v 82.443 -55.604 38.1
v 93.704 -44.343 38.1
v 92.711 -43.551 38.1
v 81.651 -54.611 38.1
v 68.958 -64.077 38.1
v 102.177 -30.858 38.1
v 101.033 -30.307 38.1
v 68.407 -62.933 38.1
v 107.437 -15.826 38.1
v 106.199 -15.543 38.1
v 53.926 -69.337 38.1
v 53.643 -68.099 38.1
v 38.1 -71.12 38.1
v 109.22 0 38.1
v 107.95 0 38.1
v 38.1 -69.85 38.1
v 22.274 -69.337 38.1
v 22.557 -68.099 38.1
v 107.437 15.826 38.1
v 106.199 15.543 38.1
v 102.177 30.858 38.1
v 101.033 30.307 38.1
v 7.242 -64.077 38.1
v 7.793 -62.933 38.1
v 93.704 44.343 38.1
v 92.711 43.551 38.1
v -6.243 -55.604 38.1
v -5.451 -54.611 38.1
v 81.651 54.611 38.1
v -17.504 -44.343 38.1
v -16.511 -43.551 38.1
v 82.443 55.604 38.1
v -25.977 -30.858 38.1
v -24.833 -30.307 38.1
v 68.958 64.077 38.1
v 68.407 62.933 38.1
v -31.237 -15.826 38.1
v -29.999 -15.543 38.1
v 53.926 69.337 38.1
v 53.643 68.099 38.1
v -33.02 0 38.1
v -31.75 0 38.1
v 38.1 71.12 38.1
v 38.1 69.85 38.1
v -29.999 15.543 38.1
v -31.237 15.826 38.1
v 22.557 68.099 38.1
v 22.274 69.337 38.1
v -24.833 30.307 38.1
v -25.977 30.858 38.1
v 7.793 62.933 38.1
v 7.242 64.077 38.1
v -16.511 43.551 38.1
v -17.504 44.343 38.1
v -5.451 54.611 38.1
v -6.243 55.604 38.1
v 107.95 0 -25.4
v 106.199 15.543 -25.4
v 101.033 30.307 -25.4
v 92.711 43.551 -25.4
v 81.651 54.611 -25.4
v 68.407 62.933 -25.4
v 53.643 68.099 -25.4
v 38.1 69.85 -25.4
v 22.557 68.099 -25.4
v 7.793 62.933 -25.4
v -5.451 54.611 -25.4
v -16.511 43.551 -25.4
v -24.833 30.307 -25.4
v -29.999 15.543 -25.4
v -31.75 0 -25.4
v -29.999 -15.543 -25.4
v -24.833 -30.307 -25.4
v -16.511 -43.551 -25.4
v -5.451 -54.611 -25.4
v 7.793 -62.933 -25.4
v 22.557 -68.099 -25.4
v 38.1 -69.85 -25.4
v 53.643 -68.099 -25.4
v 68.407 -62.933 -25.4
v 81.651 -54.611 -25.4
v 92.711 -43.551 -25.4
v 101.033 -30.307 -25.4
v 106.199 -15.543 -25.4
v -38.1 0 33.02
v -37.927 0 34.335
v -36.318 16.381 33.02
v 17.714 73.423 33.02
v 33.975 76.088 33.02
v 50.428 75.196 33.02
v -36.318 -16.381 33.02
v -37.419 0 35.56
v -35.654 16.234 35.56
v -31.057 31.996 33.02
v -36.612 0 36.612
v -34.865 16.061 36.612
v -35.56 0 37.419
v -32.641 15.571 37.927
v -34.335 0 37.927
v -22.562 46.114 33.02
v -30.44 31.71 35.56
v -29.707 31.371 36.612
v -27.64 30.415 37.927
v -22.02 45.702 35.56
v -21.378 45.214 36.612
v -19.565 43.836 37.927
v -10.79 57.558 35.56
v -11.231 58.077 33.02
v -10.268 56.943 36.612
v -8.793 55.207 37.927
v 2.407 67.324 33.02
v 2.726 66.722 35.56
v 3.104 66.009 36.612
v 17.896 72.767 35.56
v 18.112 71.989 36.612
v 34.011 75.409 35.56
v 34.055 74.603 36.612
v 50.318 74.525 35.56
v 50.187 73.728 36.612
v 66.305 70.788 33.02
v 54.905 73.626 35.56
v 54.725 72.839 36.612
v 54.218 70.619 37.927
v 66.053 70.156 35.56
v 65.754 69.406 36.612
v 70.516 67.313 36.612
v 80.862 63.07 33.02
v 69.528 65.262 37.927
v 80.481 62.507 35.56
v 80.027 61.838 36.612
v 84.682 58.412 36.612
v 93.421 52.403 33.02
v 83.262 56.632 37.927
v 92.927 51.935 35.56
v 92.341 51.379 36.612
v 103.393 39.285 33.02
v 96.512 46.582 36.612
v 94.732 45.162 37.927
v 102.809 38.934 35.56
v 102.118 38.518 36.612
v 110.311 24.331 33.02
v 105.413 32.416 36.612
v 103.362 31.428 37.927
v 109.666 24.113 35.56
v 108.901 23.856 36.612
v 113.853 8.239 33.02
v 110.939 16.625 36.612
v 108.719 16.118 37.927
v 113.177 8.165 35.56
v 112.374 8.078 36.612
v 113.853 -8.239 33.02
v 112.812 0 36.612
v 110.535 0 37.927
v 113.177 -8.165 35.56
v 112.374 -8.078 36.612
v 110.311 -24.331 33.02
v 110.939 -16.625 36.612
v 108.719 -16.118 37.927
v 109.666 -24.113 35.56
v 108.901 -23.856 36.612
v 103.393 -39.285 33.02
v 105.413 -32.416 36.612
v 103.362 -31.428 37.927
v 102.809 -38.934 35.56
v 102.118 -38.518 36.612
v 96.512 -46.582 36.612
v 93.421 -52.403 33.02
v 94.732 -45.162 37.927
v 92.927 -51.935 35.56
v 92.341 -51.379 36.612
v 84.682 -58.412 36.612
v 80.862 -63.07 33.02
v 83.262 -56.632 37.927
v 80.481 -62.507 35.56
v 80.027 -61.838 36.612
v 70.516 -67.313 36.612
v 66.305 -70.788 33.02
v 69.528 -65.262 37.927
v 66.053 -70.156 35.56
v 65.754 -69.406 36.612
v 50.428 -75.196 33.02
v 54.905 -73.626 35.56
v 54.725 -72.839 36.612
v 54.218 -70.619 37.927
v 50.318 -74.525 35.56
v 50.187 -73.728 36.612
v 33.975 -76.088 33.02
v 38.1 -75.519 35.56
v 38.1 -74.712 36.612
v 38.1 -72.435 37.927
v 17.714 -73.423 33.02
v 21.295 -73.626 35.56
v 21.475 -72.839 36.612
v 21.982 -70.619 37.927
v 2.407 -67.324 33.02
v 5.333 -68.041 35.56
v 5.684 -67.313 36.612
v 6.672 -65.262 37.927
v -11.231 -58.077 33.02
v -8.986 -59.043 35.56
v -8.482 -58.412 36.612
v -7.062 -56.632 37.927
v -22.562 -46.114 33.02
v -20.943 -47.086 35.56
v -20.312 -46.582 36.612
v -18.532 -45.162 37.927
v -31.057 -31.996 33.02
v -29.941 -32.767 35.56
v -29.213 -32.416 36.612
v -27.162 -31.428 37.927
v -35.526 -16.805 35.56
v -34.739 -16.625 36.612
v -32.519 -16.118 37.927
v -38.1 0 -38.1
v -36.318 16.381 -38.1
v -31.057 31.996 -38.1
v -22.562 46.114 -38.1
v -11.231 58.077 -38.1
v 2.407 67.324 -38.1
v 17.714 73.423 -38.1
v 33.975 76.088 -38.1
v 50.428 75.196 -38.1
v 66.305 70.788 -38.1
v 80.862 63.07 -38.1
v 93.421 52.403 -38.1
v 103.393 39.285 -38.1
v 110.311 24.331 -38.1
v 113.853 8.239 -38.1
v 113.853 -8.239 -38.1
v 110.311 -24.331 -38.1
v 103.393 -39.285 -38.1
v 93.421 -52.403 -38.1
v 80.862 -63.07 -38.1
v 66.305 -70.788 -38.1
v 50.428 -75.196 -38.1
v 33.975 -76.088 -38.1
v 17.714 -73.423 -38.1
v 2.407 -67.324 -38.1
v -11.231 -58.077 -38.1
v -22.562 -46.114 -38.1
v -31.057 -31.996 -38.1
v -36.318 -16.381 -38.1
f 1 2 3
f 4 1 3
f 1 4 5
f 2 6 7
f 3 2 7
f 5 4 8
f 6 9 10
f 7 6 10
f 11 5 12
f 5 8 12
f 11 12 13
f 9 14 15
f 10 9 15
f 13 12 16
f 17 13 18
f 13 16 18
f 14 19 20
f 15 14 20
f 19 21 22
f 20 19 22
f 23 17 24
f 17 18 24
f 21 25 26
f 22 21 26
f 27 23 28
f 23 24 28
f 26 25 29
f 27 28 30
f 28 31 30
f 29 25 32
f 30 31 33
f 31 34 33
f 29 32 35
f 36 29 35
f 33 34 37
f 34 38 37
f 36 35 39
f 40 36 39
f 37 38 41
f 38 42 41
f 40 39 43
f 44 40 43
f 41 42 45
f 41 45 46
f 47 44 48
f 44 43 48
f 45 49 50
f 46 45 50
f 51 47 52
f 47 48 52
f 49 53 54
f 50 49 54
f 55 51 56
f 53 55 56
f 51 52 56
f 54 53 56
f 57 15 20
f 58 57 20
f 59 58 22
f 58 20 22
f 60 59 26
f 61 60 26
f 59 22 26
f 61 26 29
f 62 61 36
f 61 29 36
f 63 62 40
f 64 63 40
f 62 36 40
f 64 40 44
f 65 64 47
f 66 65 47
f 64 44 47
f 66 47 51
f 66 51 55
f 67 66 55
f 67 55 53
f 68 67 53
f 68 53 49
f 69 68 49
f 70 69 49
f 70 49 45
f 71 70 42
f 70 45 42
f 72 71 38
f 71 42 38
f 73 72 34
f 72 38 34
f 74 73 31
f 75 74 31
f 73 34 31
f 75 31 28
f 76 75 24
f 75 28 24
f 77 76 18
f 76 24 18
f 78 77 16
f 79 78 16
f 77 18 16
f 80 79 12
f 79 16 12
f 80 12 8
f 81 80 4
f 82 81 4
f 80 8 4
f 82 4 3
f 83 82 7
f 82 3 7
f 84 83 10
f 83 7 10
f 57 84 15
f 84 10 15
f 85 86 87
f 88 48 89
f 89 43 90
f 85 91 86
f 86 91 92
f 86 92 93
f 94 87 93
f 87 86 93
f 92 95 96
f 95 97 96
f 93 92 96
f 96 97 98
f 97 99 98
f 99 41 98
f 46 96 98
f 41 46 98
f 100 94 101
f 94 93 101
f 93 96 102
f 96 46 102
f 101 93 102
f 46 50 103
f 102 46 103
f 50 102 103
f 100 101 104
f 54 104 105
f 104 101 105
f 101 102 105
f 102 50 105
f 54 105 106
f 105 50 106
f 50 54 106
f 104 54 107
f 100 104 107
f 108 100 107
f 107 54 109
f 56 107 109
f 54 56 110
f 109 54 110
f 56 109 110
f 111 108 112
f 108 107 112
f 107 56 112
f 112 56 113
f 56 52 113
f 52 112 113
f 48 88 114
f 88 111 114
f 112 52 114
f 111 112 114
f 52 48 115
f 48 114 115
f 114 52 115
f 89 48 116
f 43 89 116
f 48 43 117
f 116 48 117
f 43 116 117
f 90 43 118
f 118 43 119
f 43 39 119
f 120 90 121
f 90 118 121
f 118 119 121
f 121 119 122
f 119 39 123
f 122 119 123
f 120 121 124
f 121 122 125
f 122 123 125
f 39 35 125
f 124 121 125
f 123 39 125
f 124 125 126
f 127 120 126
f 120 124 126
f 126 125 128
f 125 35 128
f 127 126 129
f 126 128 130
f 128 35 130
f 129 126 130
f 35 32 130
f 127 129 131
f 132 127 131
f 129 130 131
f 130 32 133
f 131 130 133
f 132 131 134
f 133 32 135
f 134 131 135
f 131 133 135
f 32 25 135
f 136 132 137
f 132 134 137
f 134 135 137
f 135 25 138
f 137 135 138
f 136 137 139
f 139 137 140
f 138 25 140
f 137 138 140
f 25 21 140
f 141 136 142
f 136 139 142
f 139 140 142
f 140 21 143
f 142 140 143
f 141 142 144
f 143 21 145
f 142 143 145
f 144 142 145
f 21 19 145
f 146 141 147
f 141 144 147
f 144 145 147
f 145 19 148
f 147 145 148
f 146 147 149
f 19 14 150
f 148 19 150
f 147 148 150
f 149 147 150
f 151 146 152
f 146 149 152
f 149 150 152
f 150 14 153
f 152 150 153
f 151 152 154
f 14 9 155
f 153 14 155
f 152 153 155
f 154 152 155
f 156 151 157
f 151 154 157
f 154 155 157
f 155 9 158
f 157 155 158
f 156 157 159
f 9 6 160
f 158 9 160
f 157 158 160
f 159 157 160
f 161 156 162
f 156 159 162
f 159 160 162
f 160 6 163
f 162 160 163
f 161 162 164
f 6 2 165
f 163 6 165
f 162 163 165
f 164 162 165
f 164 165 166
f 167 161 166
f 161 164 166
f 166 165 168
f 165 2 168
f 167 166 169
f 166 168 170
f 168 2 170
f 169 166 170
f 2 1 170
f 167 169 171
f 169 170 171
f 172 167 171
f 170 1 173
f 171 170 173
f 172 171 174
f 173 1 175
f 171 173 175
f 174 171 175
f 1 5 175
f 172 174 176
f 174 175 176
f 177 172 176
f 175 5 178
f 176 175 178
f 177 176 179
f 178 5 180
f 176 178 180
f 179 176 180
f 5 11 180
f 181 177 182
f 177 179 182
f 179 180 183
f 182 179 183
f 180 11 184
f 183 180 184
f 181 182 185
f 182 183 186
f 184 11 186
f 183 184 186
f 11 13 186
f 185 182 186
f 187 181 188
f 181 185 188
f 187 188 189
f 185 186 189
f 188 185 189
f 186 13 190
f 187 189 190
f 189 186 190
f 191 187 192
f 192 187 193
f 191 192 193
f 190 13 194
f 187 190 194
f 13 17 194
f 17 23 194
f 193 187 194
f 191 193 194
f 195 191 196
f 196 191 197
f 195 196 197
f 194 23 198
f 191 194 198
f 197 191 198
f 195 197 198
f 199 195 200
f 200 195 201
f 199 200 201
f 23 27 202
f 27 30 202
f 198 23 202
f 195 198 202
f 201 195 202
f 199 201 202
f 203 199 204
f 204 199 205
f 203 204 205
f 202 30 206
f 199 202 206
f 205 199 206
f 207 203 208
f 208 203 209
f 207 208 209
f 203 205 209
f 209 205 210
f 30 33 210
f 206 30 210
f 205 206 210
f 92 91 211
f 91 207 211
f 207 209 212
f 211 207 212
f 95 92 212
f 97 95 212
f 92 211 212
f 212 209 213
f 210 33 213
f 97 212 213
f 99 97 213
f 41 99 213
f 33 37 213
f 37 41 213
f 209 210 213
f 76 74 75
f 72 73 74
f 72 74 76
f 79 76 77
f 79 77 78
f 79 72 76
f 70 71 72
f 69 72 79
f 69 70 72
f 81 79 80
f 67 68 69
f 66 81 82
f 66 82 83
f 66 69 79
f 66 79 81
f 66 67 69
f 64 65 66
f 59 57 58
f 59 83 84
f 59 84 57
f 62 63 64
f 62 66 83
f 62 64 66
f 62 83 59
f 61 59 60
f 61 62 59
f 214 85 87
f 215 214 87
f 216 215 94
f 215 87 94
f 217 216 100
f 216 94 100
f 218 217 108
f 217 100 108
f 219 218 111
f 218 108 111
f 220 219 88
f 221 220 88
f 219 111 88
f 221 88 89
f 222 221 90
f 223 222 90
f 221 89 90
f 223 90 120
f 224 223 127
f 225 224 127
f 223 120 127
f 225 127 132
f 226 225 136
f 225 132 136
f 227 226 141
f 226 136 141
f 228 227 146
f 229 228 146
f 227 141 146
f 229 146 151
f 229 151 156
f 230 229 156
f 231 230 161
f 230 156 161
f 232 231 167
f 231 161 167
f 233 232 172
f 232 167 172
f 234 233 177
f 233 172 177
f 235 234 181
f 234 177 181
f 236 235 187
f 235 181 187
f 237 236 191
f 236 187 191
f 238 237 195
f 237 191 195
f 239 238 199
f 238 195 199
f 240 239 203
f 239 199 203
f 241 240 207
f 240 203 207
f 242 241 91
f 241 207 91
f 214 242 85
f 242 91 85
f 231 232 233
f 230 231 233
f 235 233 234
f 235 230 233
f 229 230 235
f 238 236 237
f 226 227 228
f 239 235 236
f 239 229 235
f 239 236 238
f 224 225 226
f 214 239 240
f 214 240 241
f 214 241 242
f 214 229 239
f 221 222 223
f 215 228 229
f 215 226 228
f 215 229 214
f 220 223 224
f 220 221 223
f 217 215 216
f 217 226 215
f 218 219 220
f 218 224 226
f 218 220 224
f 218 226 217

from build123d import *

# Parameters (mm, degrees)
F0_W     = 76.2
F0_H     = 76.2
F2_R     = 69.8500005424
F3_DEPTH = 63.5
F4_R     = 5.08


with BuildPart() as f1:
    # F0 (on Front) → F1 (revolve)
    with BuildSketch(Plane.XZ):
        Rectangle(F0_W, F0_H)
    revolve(axis=Axis((38.1, 0, 0), (0, 0, -1)))

    # F2 (on face) → F3 (cut)
    with BuildSketch(Plane.XY.offset(38.1)):
        with Locations((38.1, 0)):
            Circle(F2_R)
    extrude(amount=-F3_DEPTH, mode=Mode.SUBTRACT)

    # F4
    f4_edges = [f1.edges().sort_by_distance(p)[0] for p in [
        (114.3, 0, 38.1),
    ]]
    fillet(f4_edges, radius=F4_R)


solid = f1.part
